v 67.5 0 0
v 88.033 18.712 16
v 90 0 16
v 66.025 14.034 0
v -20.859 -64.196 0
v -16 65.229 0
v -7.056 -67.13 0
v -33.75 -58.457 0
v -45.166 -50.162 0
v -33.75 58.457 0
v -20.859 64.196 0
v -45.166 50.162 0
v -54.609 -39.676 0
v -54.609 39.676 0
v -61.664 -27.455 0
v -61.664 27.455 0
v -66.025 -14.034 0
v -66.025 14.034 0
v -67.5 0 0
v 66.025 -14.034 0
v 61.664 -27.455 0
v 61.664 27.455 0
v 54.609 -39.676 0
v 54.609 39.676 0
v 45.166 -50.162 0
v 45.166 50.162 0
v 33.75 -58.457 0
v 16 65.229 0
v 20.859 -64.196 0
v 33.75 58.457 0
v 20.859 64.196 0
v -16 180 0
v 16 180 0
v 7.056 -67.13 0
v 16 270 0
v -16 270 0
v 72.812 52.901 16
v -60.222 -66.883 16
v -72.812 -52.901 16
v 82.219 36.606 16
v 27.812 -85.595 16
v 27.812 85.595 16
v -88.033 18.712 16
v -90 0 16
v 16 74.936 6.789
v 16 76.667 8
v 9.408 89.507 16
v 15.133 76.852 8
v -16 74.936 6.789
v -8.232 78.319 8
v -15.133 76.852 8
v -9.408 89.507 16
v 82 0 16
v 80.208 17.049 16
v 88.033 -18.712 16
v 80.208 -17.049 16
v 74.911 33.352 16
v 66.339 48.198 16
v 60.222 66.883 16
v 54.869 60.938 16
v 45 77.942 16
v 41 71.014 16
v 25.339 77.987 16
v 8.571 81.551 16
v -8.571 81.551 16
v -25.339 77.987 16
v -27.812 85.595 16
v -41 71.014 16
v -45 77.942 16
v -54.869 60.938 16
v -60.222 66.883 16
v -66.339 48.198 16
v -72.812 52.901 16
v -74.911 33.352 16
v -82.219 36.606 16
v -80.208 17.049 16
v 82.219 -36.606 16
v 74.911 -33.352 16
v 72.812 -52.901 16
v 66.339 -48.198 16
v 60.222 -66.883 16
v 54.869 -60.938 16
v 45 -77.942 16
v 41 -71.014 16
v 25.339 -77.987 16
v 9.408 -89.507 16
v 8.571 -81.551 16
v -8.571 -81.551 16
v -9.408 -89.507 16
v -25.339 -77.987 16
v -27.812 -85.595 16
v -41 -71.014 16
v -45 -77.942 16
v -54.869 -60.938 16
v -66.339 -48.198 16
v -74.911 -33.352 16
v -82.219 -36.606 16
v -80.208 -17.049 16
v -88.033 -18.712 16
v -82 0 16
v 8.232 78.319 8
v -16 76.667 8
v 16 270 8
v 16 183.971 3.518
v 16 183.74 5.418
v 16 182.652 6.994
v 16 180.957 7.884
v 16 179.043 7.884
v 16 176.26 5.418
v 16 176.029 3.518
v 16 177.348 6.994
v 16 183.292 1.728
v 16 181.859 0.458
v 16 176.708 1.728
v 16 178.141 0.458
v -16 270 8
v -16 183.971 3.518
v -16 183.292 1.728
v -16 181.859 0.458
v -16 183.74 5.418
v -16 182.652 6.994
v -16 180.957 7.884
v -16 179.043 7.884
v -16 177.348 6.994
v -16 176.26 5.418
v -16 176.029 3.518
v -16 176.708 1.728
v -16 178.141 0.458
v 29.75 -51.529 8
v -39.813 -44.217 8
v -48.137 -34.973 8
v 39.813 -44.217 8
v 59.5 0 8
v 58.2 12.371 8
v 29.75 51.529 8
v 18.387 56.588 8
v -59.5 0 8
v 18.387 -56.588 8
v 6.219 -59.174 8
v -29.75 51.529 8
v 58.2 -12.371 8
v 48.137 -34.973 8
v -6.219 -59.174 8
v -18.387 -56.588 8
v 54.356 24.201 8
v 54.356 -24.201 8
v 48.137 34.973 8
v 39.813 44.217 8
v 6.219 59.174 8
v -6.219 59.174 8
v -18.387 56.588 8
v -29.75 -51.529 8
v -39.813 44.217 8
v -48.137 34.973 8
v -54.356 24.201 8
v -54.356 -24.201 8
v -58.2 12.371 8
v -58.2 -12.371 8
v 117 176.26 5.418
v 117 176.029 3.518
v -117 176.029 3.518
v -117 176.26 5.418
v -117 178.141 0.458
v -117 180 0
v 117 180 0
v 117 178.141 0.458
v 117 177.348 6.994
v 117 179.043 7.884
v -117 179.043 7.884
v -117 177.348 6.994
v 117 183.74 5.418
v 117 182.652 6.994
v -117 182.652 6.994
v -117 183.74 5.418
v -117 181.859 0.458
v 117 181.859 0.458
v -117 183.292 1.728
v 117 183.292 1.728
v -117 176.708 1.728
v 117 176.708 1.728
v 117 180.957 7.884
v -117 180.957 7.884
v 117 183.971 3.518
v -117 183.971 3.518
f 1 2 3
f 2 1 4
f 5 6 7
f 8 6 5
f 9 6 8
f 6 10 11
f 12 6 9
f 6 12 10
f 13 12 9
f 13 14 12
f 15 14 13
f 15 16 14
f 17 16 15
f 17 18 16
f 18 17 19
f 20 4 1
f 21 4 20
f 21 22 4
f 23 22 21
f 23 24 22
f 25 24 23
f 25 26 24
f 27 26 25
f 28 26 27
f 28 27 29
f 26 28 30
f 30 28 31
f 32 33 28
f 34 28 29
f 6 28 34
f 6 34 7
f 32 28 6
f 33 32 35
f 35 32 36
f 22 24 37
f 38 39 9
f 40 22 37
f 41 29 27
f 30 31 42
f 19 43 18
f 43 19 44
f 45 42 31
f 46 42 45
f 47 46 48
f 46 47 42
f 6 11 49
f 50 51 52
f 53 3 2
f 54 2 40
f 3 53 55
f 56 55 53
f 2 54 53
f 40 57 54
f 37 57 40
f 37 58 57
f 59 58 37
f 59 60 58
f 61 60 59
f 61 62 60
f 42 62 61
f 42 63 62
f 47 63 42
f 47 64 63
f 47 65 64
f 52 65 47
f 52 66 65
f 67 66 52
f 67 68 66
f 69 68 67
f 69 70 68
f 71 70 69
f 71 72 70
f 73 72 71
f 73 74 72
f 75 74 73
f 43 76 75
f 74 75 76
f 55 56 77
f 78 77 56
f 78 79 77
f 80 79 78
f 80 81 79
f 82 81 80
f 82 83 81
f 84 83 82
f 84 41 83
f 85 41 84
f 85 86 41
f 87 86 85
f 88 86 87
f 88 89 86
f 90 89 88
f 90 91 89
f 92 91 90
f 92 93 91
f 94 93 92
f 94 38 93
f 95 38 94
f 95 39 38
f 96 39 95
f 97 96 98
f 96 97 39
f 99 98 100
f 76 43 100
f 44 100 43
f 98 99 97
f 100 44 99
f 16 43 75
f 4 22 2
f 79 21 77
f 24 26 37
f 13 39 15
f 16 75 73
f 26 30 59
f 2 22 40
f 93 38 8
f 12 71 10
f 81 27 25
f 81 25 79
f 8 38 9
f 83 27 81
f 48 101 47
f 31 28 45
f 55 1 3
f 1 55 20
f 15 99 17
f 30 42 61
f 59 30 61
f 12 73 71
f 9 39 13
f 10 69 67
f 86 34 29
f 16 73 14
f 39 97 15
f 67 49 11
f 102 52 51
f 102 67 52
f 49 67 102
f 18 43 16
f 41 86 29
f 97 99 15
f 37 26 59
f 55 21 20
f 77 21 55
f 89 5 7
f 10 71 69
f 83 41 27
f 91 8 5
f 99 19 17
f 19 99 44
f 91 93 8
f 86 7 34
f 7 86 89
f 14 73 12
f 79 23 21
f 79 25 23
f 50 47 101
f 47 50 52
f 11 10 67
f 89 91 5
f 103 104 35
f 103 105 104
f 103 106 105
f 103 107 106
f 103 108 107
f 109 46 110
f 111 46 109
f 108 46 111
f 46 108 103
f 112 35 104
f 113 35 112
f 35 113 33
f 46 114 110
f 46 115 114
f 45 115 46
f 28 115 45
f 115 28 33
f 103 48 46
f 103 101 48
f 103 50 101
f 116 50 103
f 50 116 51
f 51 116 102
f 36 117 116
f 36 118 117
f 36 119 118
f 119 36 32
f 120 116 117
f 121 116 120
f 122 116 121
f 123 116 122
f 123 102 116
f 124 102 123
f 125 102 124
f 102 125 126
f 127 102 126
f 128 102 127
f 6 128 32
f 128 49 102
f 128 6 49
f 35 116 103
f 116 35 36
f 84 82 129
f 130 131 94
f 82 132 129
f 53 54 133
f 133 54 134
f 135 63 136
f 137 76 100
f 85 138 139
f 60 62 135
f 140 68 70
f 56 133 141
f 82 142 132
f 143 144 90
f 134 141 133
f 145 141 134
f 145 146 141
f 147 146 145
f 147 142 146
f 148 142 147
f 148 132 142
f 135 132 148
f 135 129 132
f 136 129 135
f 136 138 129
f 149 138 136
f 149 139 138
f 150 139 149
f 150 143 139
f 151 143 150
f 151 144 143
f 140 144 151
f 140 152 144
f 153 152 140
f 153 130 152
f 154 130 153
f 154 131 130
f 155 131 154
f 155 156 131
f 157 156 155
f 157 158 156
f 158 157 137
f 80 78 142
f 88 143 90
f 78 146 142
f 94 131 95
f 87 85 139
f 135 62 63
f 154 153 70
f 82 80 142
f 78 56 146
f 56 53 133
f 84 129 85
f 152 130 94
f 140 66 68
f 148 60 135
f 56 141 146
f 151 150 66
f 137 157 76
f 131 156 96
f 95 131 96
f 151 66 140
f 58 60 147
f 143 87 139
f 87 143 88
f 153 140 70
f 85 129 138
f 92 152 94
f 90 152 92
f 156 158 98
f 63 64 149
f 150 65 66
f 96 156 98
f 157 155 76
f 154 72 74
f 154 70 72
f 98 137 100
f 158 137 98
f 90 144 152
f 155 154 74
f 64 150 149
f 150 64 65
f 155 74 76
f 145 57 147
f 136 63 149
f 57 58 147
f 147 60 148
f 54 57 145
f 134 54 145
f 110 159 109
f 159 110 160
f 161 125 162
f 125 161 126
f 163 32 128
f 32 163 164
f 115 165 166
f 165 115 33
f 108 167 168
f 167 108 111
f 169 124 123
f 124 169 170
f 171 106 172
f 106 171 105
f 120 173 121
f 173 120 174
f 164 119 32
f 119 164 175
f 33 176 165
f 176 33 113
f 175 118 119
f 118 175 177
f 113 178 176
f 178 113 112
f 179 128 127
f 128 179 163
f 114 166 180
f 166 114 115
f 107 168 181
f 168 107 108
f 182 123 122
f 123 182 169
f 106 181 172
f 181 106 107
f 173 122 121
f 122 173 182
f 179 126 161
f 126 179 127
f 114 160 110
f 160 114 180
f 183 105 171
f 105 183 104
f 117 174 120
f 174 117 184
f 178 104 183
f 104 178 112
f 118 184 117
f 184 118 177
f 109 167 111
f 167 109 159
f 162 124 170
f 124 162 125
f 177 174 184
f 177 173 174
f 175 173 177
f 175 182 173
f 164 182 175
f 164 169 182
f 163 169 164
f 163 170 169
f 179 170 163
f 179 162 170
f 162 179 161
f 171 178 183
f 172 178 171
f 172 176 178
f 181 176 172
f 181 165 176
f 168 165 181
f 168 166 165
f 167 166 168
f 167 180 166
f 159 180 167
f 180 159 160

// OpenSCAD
module frypan(d=180, t=8){ 
  
  // t = thickness of handle, pan, bar
  d_top = d; // diameter of pan (top)
  d_base = .75*d_top;
  hlen = d*1.5; // handle length
  
  difference(){
    union(){
    // outer surface and handle
      cylinder(h=2*t, d1=d_base, d2=d_top);
      translate([-2*t,0,0]){ cube([4*t,hlen,t]); }
    }
    // hollow center
    translate([0,0,t]){ cylinder(h=t, d1=d_base-2*t, d2=d_top-2*t); }
  }
  
  // pivot bar
  translate([-1*(1.3*d)/2,d,t/2]){
    rotate(a=[0,90,0]){
      cylinder(h=1.3*d, d=t);
    }
  }
}

frypan();
